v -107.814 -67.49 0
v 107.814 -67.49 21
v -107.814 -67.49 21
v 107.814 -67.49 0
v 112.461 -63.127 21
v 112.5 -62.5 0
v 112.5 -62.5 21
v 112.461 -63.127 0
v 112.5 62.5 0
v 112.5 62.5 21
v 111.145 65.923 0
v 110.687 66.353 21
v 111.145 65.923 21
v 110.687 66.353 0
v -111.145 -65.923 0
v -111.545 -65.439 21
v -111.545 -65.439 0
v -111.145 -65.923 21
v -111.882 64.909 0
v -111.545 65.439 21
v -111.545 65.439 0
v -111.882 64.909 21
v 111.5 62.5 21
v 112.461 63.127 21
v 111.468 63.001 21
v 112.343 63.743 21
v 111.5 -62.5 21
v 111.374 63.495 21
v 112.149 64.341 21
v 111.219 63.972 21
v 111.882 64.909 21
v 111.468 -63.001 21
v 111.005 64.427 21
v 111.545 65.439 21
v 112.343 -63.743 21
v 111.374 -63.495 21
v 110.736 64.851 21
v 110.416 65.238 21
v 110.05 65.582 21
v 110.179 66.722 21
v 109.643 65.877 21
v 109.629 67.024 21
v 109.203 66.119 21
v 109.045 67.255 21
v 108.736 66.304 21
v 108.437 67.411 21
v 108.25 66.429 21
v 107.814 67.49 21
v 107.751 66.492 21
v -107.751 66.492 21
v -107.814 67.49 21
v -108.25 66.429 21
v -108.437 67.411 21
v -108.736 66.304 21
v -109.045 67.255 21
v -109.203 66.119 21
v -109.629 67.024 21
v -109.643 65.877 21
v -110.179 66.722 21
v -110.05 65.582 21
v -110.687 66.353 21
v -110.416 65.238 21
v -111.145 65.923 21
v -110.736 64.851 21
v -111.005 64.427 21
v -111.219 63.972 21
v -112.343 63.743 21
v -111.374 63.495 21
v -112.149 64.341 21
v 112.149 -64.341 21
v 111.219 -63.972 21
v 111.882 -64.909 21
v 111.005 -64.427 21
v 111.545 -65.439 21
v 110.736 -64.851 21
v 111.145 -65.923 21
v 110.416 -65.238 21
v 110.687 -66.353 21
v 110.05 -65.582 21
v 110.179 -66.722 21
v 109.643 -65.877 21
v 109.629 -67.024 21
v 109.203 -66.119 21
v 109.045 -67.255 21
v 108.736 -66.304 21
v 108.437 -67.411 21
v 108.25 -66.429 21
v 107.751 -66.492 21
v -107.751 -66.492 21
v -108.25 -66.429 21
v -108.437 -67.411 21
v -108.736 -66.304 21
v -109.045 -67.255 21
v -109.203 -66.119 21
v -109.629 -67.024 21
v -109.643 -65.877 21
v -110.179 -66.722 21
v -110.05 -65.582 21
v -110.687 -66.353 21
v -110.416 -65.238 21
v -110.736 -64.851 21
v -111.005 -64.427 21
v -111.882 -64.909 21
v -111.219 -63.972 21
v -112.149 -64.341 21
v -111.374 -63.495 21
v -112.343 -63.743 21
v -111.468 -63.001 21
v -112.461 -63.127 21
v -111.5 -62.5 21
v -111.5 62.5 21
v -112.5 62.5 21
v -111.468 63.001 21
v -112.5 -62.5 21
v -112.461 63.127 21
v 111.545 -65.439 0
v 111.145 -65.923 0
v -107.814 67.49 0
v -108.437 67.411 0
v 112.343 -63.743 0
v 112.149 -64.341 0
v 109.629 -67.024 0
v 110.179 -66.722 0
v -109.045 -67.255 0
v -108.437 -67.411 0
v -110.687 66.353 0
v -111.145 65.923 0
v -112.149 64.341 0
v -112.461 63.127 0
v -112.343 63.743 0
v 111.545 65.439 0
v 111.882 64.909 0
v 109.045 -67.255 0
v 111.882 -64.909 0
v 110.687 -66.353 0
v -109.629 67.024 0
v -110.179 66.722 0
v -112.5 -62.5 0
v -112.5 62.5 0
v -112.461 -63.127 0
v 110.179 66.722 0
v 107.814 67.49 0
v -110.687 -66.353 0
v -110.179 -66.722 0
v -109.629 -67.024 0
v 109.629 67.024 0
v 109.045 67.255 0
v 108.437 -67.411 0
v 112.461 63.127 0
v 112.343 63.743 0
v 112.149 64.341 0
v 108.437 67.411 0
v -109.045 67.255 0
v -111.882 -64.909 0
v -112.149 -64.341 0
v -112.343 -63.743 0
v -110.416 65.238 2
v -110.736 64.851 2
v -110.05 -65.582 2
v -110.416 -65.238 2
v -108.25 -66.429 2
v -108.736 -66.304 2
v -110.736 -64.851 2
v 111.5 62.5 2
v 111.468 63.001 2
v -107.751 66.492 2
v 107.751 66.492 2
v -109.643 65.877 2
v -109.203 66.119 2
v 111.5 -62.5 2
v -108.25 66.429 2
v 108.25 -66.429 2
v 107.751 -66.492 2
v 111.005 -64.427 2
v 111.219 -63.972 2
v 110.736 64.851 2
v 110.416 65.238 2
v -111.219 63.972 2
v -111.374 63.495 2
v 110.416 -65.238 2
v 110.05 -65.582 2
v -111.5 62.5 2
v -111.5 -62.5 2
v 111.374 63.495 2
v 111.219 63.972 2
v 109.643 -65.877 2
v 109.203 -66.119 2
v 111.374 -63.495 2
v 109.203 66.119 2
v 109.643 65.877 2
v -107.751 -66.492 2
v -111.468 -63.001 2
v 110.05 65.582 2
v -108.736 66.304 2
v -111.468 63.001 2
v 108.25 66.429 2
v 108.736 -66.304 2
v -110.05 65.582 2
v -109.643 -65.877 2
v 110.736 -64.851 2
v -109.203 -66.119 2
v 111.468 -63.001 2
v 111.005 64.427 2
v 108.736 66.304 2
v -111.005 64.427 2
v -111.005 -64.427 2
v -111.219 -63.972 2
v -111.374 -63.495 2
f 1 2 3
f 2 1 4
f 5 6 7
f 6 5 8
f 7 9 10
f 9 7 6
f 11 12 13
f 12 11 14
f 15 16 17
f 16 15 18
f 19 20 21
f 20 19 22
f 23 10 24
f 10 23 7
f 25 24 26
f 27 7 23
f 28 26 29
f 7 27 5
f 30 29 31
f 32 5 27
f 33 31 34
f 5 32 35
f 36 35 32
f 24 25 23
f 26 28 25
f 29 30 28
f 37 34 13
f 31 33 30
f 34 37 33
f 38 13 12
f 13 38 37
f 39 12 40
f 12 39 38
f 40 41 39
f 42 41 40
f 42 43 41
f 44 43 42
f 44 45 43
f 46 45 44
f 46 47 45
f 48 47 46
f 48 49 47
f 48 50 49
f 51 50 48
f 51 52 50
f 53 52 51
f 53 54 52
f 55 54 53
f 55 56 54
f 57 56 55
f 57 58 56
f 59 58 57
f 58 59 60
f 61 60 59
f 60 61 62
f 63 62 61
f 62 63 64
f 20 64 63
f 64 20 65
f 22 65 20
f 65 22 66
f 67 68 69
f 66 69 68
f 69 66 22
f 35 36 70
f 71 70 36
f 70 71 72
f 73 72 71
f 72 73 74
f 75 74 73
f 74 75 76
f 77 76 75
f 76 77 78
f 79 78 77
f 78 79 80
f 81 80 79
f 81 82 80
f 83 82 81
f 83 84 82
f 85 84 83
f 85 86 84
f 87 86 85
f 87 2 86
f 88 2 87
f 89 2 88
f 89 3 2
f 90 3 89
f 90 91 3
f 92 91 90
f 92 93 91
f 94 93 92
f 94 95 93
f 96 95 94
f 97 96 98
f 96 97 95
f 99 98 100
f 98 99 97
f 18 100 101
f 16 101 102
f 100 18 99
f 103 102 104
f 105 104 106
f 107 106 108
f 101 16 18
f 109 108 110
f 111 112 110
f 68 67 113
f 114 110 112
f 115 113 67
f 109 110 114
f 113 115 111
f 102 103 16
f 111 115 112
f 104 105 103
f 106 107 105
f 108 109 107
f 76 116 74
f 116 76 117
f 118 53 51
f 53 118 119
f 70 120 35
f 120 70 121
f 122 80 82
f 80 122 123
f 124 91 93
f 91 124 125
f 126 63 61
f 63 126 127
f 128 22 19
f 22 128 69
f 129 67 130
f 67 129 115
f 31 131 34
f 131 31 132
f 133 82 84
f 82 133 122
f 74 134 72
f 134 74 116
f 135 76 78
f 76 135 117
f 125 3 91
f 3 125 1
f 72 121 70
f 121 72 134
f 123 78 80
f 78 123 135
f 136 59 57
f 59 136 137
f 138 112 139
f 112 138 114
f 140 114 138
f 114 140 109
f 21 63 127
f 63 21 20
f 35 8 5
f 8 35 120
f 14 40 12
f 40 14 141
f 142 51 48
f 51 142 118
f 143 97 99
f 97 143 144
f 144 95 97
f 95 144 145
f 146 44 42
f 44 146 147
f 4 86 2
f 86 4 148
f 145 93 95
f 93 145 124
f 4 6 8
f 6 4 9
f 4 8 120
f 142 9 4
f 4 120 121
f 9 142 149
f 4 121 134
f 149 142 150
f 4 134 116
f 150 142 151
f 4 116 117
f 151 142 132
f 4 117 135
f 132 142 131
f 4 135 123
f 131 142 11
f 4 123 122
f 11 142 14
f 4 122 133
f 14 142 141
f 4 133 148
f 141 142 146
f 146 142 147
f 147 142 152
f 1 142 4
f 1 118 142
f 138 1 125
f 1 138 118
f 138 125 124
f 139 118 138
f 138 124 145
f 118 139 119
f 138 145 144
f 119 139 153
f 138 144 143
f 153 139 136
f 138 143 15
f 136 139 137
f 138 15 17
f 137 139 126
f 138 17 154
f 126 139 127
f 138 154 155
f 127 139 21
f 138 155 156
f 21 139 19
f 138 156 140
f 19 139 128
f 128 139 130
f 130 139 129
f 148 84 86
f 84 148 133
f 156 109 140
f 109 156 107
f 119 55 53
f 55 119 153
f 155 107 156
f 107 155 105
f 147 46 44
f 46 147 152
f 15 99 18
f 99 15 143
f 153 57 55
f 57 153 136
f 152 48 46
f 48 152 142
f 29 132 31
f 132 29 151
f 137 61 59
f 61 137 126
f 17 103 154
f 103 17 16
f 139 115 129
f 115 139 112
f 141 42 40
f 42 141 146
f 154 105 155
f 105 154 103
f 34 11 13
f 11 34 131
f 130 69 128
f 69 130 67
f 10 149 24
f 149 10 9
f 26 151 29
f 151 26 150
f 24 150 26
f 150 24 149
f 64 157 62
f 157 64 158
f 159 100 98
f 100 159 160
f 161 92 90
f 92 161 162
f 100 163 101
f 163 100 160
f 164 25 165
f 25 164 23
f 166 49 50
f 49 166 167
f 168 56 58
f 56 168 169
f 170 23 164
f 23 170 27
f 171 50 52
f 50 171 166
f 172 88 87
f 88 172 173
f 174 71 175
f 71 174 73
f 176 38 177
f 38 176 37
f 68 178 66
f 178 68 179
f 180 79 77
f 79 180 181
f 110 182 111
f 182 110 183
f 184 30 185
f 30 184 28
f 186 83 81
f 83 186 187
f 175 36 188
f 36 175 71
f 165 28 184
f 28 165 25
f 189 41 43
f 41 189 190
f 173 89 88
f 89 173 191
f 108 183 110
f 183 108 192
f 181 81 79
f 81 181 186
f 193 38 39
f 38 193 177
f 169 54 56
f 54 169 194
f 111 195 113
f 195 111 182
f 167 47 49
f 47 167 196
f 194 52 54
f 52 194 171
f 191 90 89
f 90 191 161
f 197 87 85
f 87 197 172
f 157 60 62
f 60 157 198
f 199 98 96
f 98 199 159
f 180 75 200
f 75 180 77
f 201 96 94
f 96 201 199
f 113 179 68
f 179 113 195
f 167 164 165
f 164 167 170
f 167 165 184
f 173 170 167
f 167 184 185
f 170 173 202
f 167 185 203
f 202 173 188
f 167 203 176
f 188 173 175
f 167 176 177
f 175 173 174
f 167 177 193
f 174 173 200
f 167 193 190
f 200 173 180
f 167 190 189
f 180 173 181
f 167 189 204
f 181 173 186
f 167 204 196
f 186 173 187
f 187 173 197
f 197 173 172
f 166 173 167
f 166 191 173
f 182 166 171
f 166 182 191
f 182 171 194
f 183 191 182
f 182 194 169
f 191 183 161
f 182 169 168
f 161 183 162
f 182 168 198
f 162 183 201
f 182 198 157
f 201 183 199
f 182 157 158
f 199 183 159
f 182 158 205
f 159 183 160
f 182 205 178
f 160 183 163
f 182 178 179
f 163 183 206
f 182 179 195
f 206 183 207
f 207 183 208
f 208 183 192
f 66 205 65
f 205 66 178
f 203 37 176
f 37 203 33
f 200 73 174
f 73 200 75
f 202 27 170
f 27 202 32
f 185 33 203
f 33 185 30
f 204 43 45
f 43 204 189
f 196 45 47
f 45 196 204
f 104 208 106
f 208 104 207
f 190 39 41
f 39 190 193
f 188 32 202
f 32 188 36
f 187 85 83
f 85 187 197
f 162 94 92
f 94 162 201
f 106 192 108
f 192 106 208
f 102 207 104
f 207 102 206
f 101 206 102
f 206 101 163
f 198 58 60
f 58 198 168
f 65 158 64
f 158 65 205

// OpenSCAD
$fn = 50;


difference() {
	union() {
		hull() {
			translate(v = [-107.5000000000, 62.5000000000, 0]) {
				cylinder(h = 21, r = 5);
			}
			translate(v = [107.5000000000, 62.5000000000, 0]) {
				cylinder(h = 21, r = 5);
			}
			translate(v = [-107.5000000000, -62.5000000000, 0]) {
				cylinder(h = 21, r = 5);
			}
			translate(v = [107.5000000000, -62.5000000000, 0]) {
				cylinder(h = 21, r = 5);
			}
		}
	}
	union() {
		translate(v = [0, 0, 2]) {
			hull() {
				translate(v = [-107.5000000000, 62.5000000000, 0]) {
					cylinder(h = 19, r = 4);
				}
				translate(v = [107.5000000000, 62.5000000000, 0]) {
					cylinder(h = 19, r = 4);
				}
				translate(v = [-107.5000000000, -62.5000000000, 0]) {
					cylinder(h = 19, r = 4);
				}
				translate(v = [107.5000000000, -62.5000000000, 0]) {
					cylinder(h = 19, r = 4);
				}
			}
		}
	}
}
